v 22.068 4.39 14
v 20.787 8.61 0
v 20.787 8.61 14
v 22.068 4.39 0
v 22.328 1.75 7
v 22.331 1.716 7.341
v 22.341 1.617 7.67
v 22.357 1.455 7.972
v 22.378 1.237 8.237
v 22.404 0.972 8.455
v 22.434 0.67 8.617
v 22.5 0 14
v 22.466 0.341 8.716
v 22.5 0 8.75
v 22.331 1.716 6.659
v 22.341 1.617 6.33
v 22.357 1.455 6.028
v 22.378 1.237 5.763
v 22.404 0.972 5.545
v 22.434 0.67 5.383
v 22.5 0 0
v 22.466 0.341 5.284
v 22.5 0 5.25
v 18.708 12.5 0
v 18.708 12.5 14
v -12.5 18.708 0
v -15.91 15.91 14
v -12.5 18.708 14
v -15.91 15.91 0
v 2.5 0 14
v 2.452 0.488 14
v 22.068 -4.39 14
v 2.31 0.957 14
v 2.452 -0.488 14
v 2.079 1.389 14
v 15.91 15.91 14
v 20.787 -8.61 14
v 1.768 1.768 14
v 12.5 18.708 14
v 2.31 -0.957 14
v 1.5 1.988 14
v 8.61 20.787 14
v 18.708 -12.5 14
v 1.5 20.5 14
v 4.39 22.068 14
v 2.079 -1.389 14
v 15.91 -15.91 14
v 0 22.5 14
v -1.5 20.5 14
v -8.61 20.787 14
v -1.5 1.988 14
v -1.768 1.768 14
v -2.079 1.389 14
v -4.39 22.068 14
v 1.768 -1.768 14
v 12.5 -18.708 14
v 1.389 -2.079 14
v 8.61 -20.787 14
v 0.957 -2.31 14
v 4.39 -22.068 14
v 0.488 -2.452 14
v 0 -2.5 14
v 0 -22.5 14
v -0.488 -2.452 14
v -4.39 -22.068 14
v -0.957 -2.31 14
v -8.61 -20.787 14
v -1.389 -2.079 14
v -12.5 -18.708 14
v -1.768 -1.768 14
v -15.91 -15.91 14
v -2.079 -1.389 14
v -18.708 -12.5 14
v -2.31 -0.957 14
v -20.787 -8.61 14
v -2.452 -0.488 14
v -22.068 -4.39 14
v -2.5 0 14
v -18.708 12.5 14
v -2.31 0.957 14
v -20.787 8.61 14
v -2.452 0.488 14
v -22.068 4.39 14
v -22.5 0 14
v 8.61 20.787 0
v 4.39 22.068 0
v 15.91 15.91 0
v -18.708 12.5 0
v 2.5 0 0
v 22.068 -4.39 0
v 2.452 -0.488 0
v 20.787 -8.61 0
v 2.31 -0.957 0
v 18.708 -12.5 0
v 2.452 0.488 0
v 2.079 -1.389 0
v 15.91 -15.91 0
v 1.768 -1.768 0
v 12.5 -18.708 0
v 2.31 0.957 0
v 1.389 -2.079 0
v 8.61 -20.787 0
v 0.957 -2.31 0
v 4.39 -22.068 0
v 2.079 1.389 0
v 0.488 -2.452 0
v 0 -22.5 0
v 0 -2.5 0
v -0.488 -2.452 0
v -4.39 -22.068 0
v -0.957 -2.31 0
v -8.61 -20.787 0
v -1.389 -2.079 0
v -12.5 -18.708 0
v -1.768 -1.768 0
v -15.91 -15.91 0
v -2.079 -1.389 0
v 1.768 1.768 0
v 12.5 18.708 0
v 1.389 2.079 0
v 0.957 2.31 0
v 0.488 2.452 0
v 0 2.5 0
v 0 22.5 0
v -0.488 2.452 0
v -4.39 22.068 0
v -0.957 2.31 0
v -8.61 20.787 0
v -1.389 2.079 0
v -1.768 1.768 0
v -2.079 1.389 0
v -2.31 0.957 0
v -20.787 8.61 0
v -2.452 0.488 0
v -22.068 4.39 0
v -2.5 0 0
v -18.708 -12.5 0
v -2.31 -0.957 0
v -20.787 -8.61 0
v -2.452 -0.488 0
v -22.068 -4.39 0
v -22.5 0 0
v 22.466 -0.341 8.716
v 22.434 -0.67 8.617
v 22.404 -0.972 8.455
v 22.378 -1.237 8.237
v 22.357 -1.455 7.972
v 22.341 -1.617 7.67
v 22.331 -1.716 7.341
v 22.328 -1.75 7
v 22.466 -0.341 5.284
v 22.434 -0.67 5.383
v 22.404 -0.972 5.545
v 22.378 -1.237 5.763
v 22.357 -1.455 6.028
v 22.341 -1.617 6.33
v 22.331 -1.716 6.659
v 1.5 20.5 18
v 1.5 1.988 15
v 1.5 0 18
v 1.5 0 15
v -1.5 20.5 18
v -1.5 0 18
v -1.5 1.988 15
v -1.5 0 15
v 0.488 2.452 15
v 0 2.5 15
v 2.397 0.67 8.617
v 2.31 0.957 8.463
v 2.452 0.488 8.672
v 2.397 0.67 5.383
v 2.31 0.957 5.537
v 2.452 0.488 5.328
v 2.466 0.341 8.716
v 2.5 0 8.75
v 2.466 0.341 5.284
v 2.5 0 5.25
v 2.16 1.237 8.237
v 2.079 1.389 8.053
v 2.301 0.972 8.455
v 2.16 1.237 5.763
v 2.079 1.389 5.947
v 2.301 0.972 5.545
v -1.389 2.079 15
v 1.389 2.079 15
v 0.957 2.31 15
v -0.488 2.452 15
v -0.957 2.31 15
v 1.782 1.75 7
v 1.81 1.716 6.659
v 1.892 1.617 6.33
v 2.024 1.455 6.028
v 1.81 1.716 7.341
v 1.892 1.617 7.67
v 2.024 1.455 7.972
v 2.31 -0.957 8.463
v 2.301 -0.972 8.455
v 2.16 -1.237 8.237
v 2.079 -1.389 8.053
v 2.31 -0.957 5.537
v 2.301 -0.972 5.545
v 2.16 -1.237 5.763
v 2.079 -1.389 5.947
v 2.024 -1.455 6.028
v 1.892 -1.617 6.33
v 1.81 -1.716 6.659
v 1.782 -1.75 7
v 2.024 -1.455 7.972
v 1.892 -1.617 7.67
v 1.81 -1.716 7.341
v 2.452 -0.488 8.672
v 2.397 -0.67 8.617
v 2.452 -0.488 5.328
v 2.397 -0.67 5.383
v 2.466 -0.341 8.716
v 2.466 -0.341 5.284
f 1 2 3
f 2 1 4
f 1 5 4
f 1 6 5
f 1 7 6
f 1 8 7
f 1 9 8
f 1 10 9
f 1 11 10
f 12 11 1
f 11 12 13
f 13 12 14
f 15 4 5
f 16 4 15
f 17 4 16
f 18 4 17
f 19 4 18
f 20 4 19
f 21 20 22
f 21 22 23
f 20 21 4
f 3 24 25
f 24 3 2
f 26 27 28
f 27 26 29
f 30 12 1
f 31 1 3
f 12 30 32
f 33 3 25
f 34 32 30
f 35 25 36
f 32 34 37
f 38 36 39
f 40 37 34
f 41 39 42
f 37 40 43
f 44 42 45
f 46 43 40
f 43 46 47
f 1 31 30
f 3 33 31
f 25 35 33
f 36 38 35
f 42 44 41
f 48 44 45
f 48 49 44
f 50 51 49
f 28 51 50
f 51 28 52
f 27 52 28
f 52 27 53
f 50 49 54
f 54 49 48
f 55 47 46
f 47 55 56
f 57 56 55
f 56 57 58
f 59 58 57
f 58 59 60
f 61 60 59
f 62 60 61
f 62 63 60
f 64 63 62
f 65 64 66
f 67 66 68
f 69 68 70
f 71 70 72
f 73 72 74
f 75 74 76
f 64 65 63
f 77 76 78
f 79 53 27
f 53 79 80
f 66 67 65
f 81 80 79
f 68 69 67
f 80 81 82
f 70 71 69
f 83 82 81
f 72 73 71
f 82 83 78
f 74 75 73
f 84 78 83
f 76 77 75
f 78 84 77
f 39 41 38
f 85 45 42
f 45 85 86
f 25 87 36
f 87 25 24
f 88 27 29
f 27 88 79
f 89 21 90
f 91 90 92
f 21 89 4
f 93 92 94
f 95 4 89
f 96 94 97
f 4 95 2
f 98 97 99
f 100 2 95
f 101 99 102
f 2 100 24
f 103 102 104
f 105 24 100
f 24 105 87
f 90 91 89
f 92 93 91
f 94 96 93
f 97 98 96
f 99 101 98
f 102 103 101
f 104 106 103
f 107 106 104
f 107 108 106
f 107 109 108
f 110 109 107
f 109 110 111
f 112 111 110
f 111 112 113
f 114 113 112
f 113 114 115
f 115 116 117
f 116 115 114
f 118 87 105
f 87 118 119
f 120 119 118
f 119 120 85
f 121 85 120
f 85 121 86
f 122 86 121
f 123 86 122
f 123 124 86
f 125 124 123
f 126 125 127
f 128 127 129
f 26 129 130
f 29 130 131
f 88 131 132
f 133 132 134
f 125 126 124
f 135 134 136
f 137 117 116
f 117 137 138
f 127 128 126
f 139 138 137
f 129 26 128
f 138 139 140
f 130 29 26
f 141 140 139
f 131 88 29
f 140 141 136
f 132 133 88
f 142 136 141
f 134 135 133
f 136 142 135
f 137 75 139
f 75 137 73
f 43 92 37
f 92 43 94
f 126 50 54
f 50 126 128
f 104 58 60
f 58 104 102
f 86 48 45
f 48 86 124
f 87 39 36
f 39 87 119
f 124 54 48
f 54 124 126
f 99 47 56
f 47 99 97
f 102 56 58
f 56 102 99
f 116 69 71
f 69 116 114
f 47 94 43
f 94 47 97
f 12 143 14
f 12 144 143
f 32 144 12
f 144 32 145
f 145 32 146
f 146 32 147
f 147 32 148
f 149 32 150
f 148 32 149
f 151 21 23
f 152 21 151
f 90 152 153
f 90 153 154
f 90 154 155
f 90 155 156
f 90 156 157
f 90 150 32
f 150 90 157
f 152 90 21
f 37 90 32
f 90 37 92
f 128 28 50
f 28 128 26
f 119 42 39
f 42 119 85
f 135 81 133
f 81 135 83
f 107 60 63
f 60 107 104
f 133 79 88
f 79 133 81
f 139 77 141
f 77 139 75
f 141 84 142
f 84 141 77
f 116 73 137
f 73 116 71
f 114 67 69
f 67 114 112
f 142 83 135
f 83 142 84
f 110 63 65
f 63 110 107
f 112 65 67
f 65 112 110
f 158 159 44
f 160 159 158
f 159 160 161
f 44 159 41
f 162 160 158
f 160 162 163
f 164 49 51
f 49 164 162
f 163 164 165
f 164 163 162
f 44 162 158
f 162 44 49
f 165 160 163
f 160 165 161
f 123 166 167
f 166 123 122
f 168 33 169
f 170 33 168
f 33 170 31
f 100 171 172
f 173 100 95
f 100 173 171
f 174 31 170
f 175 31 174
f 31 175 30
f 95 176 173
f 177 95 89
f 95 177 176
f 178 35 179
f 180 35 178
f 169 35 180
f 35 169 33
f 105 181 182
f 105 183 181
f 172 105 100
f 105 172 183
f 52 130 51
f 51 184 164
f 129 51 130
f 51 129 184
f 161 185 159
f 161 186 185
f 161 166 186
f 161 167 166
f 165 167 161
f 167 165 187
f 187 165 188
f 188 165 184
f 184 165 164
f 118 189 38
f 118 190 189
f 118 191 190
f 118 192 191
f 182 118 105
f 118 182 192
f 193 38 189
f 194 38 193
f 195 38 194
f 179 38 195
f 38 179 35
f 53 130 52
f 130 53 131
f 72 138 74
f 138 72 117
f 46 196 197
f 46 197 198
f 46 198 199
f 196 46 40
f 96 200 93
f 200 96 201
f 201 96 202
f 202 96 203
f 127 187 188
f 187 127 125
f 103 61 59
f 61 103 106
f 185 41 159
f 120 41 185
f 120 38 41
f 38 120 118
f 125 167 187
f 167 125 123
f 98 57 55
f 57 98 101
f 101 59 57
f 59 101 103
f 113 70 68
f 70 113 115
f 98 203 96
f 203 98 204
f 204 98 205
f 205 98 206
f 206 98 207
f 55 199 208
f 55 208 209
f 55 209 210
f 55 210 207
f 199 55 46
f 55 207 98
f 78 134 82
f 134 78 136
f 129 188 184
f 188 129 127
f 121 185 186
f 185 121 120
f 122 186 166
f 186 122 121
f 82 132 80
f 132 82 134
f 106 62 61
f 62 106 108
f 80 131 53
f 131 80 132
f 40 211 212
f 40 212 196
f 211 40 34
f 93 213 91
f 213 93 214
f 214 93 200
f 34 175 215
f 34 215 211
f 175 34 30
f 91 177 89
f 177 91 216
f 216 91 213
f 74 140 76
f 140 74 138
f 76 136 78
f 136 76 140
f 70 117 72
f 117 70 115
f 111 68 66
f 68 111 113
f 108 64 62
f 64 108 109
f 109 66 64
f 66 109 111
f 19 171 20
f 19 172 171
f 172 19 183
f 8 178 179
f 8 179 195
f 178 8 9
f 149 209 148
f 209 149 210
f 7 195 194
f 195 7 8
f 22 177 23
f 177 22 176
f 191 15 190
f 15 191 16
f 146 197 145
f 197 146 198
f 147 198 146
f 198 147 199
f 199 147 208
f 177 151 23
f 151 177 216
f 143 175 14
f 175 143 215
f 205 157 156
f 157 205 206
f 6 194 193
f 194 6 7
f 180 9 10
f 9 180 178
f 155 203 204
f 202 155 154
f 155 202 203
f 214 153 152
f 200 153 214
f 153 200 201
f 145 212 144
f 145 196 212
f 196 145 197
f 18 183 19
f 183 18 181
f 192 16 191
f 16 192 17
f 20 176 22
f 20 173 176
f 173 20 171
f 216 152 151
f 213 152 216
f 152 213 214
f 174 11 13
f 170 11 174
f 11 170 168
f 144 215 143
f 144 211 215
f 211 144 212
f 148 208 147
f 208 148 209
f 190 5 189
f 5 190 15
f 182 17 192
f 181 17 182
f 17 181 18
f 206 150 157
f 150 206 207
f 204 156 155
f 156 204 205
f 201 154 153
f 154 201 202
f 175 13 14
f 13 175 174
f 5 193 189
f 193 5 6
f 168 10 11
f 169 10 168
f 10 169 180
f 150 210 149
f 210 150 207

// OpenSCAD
$fn = 32;

// ----------------------------------------------------------------------
// Control knob: pointer knob
// ----------------------------------------------------------------------

// --- parameters (mm) ---
rib_w = 3;                // pointer rib width
rib_h = 5;                // pointer rib height
knob_d = 45;              // knob body diameter
knob_h = 14;              // knob body height
bore_d = 5;               // shaft bore diameter
set_d = 3.5;              // set screw bore diameter

rib_poke = rib_h - 1;  // rib height above the top
total_h = knob_h + rib_h - 1;  // overall height

difference() {
  union() {
    cylinder(h = knob_h, d = knob_d);
    translate([-rib_w / 2, 0, knob_h - 1])
      cube([rib_w, knob_d / 2 - 2, rib_h]);
  }
  translate([0, 0, -1]) cylinder(h = knob_h + 2, d = bore_d);
  translate([-1, 0, knob_h / 2]) rotate([0, 90, 0])
    cylinder(h = knob_d / 2 + bore_d / 2 + 2, d = set_d);}
